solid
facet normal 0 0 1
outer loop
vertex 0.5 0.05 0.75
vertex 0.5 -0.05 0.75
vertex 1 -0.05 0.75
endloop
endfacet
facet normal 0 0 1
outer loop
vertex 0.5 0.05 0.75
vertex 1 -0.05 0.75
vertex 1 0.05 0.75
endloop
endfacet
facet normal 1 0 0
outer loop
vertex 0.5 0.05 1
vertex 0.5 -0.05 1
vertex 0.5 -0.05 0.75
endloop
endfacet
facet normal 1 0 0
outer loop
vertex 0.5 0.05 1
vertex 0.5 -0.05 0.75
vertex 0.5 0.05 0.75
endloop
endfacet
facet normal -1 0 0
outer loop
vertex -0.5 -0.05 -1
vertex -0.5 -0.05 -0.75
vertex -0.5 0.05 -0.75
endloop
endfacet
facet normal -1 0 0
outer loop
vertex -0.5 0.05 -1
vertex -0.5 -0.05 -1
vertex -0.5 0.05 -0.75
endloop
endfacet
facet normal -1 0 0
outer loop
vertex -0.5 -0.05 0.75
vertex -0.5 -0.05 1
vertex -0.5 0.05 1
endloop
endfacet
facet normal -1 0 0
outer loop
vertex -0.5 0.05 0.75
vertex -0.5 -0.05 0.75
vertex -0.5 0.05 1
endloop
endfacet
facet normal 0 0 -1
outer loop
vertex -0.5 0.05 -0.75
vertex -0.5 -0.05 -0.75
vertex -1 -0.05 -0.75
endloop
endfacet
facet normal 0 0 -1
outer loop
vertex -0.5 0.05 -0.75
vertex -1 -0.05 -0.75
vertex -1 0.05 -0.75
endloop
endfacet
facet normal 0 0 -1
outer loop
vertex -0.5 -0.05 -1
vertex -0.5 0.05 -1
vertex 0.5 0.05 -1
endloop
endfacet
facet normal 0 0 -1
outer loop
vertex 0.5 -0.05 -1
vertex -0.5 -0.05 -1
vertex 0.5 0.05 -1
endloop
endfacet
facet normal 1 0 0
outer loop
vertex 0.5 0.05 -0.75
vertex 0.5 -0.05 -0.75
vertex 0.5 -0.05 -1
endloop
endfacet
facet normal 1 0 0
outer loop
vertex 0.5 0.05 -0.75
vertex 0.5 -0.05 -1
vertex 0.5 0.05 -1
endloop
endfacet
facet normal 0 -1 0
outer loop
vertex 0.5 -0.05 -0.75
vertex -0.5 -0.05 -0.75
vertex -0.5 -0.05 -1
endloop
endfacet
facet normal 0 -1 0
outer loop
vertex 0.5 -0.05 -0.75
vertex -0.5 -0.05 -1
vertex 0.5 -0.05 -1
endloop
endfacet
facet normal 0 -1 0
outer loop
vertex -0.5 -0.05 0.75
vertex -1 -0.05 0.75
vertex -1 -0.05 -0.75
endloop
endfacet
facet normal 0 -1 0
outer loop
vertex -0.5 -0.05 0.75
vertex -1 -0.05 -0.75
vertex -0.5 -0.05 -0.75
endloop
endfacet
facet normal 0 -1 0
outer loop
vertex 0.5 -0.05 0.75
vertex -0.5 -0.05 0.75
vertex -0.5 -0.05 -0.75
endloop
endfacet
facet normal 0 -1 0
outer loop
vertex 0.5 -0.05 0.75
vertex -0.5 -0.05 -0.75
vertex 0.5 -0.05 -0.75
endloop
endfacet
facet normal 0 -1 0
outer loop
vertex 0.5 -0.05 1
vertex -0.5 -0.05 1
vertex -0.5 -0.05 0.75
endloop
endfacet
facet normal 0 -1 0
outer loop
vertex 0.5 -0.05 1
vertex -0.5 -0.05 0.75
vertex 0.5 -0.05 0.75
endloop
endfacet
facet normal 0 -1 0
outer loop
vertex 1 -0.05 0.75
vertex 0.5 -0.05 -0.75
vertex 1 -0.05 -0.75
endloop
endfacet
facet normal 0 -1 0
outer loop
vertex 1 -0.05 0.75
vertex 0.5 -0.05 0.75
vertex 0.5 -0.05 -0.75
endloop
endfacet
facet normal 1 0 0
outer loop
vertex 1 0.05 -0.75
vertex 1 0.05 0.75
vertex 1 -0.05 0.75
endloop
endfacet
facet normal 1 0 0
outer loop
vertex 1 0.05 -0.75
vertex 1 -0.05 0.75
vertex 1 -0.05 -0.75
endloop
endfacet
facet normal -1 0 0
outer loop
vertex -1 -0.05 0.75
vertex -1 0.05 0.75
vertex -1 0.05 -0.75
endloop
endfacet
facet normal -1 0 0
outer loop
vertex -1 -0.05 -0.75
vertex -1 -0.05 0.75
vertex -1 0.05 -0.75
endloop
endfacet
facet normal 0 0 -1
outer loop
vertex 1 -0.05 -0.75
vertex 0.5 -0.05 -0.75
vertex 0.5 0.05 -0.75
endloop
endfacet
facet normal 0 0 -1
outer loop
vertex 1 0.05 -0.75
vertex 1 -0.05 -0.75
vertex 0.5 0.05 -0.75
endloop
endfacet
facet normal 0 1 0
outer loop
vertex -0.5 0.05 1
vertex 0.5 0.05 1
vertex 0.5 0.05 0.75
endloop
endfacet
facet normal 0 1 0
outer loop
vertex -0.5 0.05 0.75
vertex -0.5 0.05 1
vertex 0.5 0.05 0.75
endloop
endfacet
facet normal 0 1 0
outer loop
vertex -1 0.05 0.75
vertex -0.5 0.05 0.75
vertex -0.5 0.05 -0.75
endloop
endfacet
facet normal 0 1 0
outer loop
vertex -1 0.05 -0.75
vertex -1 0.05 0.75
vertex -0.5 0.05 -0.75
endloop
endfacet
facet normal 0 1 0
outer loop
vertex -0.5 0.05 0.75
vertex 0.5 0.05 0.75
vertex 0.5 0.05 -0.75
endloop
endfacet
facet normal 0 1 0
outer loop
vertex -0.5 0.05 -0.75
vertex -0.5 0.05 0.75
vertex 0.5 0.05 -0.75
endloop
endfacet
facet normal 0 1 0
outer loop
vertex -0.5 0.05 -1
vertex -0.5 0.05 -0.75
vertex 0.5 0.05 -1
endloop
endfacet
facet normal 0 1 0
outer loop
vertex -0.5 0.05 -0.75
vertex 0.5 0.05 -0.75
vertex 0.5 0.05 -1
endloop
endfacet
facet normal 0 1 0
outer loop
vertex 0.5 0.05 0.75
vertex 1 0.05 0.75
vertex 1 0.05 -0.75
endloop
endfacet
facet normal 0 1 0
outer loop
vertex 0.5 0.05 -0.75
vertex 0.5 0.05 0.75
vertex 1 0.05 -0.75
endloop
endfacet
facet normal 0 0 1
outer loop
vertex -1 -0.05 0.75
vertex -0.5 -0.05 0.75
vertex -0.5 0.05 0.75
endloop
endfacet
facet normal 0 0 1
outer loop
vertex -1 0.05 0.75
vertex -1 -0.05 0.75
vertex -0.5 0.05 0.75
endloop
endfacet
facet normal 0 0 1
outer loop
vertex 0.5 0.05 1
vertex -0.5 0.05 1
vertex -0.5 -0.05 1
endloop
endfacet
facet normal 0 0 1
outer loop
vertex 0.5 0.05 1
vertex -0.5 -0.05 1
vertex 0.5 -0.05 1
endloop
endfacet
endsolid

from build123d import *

# Parameters (mm, degrees)
SALIENTE_EXTRUIR2_DEPTH      = 1
SALIENTE_EXTRUIR2_DEPTH_BACK = 1
CROQUIS2_W                   = 1
CROQUIS2_H                   = 0.1
SALIENTE_EXTRUIR3_DEPTH      = 1
SALIENTE_EXTRUIR3_DEPTH_BACK = 1
CROQUIS3_W                   = 1.5
CROQUIS3_H                   = 0.1


with BuildPart() as part:
    # Croquis2 → Saliente-Extruir2 (new, two sides: drawn at the far end of the back side and taken through both)
    with BuildSketch(Plane.XY.offset(-SALIENTE_EXTRUIR2_DEPTH_BACK)):
        Rectangle(CROQUIS2_W, CROQUIS2_H)
    extrude(amount=SALIENTE_EXTRUIR2_DEPTH + SALIENTE_EXTRUIR2_DEPTH_BACK)

    # Croquis3 → Saliente-Extruir3 (add, two sides: drawn at the far end of the back side and taken through both)
    with BuildSketch(Plane(origin=(0, 0, 0), x_dir=(0, 0, -1), z_dir=(1, 0, 0)).offset(-SALIENTE_EXTRUIR3_DEPTH_BACK)):
        Rectangle(CROQUIS3_W, CROQUIS3_H)
    extrude(amount=SALIENTE_EXTRUIR3_DEPTH + SALIENTE_EXTRUIR3_DEPTH_BACK)


solid = part.part
